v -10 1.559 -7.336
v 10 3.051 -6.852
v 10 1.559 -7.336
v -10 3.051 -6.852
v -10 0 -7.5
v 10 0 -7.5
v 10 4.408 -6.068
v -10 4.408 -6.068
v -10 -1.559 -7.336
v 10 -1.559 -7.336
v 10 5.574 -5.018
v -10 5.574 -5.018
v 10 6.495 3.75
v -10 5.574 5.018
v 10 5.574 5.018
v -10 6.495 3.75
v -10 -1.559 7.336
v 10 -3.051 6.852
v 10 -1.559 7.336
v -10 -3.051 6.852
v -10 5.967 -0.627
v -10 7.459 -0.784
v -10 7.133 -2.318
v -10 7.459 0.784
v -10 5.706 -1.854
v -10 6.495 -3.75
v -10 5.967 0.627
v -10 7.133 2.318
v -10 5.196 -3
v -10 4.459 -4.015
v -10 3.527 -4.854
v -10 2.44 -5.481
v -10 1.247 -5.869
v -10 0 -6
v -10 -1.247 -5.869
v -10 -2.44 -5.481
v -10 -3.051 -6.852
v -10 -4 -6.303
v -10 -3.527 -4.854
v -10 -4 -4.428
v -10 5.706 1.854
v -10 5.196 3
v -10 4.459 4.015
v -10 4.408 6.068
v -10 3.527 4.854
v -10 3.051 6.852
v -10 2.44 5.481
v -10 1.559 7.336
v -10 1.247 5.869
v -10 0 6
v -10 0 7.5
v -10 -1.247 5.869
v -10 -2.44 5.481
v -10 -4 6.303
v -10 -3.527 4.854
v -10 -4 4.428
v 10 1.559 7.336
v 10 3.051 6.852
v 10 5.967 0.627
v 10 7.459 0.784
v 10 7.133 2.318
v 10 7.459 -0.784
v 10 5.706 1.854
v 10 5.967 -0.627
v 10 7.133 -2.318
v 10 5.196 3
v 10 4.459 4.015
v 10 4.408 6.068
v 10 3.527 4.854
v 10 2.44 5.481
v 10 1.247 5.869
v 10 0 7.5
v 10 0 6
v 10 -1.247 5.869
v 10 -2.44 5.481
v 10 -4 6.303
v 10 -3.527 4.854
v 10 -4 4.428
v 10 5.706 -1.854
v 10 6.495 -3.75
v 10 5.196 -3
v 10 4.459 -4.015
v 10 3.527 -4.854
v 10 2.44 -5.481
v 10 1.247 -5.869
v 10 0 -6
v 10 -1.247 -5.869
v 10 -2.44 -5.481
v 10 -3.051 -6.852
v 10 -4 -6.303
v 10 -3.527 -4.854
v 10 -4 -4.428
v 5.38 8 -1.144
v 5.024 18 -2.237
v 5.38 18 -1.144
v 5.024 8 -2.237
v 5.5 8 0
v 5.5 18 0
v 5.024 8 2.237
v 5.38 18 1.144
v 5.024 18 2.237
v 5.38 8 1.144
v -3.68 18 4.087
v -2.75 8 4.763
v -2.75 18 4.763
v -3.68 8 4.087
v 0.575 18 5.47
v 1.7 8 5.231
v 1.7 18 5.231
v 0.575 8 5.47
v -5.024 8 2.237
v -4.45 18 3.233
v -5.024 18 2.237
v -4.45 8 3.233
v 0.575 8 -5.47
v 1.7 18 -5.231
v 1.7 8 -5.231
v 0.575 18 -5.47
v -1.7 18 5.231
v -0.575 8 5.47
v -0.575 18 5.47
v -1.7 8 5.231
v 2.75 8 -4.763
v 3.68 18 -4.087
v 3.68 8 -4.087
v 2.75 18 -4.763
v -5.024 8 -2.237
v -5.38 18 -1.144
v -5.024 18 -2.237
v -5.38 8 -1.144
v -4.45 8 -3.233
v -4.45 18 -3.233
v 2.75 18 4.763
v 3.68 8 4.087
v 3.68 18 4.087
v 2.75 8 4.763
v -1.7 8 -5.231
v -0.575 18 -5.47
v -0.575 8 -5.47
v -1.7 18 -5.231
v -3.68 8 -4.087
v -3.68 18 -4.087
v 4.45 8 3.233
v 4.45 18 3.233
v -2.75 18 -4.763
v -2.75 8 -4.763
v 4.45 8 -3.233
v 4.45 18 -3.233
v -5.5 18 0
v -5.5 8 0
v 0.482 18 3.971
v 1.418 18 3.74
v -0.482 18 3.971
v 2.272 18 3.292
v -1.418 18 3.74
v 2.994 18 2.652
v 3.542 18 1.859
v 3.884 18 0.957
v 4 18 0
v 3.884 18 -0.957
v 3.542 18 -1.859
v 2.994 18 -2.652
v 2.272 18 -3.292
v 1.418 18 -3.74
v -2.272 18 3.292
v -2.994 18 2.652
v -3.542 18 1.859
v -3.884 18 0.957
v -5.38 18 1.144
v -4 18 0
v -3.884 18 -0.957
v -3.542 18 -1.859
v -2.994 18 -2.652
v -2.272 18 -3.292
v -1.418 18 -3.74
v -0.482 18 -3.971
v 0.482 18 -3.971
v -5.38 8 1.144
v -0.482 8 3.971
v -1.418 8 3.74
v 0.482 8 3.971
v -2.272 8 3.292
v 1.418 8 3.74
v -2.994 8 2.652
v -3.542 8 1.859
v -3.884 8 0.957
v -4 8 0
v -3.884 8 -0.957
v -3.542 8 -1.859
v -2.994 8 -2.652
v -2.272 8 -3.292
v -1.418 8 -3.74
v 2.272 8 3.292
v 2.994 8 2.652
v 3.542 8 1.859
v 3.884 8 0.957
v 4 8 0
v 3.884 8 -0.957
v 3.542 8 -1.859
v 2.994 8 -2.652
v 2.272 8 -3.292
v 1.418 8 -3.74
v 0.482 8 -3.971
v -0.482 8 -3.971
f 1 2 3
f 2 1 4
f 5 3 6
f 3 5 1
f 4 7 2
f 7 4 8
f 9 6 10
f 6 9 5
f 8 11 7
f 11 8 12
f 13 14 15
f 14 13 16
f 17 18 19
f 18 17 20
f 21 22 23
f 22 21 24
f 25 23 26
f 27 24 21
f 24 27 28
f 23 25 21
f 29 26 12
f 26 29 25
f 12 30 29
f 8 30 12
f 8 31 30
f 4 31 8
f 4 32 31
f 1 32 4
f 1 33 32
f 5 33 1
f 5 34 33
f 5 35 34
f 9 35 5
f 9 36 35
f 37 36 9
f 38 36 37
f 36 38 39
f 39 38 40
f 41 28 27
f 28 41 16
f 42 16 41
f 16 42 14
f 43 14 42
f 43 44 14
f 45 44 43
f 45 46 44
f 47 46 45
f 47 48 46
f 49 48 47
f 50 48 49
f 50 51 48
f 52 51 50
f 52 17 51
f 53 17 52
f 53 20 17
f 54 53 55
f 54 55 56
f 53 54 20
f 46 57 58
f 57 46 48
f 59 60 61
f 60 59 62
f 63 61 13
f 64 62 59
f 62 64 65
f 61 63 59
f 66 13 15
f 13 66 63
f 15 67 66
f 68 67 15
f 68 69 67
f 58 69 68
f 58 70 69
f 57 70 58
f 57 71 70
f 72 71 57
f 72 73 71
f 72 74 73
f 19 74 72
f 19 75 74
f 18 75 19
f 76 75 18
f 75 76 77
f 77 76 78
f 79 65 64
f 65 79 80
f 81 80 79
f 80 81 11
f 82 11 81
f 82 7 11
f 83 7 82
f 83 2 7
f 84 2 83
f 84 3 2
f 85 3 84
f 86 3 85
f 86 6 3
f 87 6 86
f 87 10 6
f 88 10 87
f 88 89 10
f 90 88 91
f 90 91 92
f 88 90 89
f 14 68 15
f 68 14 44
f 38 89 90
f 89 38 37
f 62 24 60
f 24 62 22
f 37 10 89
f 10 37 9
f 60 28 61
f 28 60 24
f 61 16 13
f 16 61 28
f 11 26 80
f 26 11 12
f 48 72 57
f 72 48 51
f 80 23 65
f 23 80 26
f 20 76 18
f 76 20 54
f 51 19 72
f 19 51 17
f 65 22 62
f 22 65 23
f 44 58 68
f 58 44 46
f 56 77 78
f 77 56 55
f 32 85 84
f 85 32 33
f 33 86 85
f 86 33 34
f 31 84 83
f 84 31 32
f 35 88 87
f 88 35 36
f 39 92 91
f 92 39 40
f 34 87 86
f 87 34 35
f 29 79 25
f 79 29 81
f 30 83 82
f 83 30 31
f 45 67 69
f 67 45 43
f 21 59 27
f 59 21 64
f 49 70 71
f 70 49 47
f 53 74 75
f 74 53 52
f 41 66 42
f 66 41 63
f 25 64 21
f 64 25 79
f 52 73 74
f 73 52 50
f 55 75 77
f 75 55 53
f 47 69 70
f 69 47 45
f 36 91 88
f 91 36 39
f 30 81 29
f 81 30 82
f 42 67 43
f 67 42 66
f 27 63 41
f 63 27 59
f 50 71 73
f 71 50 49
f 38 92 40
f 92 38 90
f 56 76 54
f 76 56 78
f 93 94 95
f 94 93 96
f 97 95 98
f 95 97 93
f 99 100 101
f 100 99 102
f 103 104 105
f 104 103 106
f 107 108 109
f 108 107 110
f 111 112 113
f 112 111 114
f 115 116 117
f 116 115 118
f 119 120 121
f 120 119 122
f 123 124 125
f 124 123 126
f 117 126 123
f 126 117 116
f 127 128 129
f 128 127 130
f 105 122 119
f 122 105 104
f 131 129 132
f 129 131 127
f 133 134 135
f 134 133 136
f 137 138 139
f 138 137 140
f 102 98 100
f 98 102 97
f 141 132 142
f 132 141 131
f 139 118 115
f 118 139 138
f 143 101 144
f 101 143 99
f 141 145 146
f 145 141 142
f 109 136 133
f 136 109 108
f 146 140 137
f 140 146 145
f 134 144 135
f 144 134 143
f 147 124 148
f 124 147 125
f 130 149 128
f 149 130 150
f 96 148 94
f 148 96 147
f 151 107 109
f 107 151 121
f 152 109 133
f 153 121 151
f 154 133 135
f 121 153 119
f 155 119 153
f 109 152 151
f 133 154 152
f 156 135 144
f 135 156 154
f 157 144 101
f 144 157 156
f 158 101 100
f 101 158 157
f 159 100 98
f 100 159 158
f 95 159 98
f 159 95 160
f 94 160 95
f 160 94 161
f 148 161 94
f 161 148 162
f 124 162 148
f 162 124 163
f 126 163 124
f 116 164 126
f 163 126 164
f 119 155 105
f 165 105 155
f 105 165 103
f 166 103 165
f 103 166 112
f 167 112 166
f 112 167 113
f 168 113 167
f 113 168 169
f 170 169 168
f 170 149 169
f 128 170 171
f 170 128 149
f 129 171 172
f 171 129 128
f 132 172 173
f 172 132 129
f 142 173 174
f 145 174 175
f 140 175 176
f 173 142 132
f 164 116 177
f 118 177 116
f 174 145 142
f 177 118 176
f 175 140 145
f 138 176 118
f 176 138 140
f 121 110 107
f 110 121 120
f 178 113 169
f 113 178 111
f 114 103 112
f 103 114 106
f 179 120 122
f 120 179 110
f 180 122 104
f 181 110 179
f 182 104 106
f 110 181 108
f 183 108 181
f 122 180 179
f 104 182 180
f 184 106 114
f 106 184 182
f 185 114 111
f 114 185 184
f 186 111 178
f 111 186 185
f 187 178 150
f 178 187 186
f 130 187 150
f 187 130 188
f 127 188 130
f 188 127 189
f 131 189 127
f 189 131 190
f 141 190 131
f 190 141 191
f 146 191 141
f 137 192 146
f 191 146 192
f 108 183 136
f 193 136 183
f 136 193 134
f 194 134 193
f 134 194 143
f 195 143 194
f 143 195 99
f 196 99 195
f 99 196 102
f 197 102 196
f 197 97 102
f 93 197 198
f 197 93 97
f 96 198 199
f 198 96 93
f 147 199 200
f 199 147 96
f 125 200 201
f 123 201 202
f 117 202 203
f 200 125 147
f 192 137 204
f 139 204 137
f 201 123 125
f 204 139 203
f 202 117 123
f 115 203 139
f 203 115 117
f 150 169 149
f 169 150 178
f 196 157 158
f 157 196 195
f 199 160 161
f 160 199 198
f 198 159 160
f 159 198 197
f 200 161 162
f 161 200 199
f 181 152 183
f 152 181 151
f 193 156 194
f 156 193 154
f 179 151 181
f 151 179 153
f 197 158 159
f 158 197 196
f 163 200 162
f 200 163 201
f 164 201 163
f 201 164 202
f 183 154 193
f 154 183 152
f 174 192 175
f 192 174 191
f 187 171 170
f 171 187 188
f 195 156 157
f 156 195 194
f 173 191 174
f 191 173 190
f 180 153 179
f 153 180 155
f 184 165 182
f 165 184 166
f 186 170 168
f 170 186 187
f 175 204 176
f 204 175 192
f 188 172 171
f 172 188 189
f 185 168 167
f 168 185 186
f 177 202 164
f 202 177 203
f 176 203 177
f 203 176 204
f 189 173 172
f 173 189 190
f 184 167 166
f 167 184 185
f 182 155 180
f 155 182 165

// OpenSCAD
$fs=1;

union() {
	difference() {
		rotate(a = [0, 90, 0]) {
			difference() {
				translate(v = [0, 0, -10.0000000000]) {
					cylinder(d = 15, h = 20);
				}
				translate(v = [0, 0, -10.0000000000]) {
					cylinder(d = 12, h = 20);
				}
			}
		}
		#translate(v = [0, -4, 0]) {
			translate(v = [0, -10.0000000000, 0]) {
				translate(v = [-10.0000000000, -10.0000000000, -10.0000000000]) {
					cube(size = 20);
				}
			}
		}
	}
	translate(v = [0, 8, 0]) {
		rotate(a = [-90, 0, 0]) {
			difference() {
				cylinder(d = 11, h = 10);
				cylinder(d = 8, h = 10);
			}
		}
	}
}
/***********************************************
*********      SolidPython code:      **********
************************************************
 
from solid import *
from solid import extensions

sliderL=20
sliderD=12
sliderHold = (cylinder(d=sliderD+3,h=sliderL).center()-cylinder(d=sliderD,h=sliderL).center()).rot(y=90)-cube(sliderL).align('front').move(y=-sliderD/3).debug()

rodD=8
rodL=10
rodSupport = (cylinder(d=rodD+3,h=rodL)-cylinder(d=rodD,h=rodL)).rot(x=-90).move(y=sliderD/2+2)

scene = sliderHold + rodSupport
scad_render_to_file(scene, 'x2ySliderAndRodSupport.scad', '$fs=1;')
 
 
************************************************/
